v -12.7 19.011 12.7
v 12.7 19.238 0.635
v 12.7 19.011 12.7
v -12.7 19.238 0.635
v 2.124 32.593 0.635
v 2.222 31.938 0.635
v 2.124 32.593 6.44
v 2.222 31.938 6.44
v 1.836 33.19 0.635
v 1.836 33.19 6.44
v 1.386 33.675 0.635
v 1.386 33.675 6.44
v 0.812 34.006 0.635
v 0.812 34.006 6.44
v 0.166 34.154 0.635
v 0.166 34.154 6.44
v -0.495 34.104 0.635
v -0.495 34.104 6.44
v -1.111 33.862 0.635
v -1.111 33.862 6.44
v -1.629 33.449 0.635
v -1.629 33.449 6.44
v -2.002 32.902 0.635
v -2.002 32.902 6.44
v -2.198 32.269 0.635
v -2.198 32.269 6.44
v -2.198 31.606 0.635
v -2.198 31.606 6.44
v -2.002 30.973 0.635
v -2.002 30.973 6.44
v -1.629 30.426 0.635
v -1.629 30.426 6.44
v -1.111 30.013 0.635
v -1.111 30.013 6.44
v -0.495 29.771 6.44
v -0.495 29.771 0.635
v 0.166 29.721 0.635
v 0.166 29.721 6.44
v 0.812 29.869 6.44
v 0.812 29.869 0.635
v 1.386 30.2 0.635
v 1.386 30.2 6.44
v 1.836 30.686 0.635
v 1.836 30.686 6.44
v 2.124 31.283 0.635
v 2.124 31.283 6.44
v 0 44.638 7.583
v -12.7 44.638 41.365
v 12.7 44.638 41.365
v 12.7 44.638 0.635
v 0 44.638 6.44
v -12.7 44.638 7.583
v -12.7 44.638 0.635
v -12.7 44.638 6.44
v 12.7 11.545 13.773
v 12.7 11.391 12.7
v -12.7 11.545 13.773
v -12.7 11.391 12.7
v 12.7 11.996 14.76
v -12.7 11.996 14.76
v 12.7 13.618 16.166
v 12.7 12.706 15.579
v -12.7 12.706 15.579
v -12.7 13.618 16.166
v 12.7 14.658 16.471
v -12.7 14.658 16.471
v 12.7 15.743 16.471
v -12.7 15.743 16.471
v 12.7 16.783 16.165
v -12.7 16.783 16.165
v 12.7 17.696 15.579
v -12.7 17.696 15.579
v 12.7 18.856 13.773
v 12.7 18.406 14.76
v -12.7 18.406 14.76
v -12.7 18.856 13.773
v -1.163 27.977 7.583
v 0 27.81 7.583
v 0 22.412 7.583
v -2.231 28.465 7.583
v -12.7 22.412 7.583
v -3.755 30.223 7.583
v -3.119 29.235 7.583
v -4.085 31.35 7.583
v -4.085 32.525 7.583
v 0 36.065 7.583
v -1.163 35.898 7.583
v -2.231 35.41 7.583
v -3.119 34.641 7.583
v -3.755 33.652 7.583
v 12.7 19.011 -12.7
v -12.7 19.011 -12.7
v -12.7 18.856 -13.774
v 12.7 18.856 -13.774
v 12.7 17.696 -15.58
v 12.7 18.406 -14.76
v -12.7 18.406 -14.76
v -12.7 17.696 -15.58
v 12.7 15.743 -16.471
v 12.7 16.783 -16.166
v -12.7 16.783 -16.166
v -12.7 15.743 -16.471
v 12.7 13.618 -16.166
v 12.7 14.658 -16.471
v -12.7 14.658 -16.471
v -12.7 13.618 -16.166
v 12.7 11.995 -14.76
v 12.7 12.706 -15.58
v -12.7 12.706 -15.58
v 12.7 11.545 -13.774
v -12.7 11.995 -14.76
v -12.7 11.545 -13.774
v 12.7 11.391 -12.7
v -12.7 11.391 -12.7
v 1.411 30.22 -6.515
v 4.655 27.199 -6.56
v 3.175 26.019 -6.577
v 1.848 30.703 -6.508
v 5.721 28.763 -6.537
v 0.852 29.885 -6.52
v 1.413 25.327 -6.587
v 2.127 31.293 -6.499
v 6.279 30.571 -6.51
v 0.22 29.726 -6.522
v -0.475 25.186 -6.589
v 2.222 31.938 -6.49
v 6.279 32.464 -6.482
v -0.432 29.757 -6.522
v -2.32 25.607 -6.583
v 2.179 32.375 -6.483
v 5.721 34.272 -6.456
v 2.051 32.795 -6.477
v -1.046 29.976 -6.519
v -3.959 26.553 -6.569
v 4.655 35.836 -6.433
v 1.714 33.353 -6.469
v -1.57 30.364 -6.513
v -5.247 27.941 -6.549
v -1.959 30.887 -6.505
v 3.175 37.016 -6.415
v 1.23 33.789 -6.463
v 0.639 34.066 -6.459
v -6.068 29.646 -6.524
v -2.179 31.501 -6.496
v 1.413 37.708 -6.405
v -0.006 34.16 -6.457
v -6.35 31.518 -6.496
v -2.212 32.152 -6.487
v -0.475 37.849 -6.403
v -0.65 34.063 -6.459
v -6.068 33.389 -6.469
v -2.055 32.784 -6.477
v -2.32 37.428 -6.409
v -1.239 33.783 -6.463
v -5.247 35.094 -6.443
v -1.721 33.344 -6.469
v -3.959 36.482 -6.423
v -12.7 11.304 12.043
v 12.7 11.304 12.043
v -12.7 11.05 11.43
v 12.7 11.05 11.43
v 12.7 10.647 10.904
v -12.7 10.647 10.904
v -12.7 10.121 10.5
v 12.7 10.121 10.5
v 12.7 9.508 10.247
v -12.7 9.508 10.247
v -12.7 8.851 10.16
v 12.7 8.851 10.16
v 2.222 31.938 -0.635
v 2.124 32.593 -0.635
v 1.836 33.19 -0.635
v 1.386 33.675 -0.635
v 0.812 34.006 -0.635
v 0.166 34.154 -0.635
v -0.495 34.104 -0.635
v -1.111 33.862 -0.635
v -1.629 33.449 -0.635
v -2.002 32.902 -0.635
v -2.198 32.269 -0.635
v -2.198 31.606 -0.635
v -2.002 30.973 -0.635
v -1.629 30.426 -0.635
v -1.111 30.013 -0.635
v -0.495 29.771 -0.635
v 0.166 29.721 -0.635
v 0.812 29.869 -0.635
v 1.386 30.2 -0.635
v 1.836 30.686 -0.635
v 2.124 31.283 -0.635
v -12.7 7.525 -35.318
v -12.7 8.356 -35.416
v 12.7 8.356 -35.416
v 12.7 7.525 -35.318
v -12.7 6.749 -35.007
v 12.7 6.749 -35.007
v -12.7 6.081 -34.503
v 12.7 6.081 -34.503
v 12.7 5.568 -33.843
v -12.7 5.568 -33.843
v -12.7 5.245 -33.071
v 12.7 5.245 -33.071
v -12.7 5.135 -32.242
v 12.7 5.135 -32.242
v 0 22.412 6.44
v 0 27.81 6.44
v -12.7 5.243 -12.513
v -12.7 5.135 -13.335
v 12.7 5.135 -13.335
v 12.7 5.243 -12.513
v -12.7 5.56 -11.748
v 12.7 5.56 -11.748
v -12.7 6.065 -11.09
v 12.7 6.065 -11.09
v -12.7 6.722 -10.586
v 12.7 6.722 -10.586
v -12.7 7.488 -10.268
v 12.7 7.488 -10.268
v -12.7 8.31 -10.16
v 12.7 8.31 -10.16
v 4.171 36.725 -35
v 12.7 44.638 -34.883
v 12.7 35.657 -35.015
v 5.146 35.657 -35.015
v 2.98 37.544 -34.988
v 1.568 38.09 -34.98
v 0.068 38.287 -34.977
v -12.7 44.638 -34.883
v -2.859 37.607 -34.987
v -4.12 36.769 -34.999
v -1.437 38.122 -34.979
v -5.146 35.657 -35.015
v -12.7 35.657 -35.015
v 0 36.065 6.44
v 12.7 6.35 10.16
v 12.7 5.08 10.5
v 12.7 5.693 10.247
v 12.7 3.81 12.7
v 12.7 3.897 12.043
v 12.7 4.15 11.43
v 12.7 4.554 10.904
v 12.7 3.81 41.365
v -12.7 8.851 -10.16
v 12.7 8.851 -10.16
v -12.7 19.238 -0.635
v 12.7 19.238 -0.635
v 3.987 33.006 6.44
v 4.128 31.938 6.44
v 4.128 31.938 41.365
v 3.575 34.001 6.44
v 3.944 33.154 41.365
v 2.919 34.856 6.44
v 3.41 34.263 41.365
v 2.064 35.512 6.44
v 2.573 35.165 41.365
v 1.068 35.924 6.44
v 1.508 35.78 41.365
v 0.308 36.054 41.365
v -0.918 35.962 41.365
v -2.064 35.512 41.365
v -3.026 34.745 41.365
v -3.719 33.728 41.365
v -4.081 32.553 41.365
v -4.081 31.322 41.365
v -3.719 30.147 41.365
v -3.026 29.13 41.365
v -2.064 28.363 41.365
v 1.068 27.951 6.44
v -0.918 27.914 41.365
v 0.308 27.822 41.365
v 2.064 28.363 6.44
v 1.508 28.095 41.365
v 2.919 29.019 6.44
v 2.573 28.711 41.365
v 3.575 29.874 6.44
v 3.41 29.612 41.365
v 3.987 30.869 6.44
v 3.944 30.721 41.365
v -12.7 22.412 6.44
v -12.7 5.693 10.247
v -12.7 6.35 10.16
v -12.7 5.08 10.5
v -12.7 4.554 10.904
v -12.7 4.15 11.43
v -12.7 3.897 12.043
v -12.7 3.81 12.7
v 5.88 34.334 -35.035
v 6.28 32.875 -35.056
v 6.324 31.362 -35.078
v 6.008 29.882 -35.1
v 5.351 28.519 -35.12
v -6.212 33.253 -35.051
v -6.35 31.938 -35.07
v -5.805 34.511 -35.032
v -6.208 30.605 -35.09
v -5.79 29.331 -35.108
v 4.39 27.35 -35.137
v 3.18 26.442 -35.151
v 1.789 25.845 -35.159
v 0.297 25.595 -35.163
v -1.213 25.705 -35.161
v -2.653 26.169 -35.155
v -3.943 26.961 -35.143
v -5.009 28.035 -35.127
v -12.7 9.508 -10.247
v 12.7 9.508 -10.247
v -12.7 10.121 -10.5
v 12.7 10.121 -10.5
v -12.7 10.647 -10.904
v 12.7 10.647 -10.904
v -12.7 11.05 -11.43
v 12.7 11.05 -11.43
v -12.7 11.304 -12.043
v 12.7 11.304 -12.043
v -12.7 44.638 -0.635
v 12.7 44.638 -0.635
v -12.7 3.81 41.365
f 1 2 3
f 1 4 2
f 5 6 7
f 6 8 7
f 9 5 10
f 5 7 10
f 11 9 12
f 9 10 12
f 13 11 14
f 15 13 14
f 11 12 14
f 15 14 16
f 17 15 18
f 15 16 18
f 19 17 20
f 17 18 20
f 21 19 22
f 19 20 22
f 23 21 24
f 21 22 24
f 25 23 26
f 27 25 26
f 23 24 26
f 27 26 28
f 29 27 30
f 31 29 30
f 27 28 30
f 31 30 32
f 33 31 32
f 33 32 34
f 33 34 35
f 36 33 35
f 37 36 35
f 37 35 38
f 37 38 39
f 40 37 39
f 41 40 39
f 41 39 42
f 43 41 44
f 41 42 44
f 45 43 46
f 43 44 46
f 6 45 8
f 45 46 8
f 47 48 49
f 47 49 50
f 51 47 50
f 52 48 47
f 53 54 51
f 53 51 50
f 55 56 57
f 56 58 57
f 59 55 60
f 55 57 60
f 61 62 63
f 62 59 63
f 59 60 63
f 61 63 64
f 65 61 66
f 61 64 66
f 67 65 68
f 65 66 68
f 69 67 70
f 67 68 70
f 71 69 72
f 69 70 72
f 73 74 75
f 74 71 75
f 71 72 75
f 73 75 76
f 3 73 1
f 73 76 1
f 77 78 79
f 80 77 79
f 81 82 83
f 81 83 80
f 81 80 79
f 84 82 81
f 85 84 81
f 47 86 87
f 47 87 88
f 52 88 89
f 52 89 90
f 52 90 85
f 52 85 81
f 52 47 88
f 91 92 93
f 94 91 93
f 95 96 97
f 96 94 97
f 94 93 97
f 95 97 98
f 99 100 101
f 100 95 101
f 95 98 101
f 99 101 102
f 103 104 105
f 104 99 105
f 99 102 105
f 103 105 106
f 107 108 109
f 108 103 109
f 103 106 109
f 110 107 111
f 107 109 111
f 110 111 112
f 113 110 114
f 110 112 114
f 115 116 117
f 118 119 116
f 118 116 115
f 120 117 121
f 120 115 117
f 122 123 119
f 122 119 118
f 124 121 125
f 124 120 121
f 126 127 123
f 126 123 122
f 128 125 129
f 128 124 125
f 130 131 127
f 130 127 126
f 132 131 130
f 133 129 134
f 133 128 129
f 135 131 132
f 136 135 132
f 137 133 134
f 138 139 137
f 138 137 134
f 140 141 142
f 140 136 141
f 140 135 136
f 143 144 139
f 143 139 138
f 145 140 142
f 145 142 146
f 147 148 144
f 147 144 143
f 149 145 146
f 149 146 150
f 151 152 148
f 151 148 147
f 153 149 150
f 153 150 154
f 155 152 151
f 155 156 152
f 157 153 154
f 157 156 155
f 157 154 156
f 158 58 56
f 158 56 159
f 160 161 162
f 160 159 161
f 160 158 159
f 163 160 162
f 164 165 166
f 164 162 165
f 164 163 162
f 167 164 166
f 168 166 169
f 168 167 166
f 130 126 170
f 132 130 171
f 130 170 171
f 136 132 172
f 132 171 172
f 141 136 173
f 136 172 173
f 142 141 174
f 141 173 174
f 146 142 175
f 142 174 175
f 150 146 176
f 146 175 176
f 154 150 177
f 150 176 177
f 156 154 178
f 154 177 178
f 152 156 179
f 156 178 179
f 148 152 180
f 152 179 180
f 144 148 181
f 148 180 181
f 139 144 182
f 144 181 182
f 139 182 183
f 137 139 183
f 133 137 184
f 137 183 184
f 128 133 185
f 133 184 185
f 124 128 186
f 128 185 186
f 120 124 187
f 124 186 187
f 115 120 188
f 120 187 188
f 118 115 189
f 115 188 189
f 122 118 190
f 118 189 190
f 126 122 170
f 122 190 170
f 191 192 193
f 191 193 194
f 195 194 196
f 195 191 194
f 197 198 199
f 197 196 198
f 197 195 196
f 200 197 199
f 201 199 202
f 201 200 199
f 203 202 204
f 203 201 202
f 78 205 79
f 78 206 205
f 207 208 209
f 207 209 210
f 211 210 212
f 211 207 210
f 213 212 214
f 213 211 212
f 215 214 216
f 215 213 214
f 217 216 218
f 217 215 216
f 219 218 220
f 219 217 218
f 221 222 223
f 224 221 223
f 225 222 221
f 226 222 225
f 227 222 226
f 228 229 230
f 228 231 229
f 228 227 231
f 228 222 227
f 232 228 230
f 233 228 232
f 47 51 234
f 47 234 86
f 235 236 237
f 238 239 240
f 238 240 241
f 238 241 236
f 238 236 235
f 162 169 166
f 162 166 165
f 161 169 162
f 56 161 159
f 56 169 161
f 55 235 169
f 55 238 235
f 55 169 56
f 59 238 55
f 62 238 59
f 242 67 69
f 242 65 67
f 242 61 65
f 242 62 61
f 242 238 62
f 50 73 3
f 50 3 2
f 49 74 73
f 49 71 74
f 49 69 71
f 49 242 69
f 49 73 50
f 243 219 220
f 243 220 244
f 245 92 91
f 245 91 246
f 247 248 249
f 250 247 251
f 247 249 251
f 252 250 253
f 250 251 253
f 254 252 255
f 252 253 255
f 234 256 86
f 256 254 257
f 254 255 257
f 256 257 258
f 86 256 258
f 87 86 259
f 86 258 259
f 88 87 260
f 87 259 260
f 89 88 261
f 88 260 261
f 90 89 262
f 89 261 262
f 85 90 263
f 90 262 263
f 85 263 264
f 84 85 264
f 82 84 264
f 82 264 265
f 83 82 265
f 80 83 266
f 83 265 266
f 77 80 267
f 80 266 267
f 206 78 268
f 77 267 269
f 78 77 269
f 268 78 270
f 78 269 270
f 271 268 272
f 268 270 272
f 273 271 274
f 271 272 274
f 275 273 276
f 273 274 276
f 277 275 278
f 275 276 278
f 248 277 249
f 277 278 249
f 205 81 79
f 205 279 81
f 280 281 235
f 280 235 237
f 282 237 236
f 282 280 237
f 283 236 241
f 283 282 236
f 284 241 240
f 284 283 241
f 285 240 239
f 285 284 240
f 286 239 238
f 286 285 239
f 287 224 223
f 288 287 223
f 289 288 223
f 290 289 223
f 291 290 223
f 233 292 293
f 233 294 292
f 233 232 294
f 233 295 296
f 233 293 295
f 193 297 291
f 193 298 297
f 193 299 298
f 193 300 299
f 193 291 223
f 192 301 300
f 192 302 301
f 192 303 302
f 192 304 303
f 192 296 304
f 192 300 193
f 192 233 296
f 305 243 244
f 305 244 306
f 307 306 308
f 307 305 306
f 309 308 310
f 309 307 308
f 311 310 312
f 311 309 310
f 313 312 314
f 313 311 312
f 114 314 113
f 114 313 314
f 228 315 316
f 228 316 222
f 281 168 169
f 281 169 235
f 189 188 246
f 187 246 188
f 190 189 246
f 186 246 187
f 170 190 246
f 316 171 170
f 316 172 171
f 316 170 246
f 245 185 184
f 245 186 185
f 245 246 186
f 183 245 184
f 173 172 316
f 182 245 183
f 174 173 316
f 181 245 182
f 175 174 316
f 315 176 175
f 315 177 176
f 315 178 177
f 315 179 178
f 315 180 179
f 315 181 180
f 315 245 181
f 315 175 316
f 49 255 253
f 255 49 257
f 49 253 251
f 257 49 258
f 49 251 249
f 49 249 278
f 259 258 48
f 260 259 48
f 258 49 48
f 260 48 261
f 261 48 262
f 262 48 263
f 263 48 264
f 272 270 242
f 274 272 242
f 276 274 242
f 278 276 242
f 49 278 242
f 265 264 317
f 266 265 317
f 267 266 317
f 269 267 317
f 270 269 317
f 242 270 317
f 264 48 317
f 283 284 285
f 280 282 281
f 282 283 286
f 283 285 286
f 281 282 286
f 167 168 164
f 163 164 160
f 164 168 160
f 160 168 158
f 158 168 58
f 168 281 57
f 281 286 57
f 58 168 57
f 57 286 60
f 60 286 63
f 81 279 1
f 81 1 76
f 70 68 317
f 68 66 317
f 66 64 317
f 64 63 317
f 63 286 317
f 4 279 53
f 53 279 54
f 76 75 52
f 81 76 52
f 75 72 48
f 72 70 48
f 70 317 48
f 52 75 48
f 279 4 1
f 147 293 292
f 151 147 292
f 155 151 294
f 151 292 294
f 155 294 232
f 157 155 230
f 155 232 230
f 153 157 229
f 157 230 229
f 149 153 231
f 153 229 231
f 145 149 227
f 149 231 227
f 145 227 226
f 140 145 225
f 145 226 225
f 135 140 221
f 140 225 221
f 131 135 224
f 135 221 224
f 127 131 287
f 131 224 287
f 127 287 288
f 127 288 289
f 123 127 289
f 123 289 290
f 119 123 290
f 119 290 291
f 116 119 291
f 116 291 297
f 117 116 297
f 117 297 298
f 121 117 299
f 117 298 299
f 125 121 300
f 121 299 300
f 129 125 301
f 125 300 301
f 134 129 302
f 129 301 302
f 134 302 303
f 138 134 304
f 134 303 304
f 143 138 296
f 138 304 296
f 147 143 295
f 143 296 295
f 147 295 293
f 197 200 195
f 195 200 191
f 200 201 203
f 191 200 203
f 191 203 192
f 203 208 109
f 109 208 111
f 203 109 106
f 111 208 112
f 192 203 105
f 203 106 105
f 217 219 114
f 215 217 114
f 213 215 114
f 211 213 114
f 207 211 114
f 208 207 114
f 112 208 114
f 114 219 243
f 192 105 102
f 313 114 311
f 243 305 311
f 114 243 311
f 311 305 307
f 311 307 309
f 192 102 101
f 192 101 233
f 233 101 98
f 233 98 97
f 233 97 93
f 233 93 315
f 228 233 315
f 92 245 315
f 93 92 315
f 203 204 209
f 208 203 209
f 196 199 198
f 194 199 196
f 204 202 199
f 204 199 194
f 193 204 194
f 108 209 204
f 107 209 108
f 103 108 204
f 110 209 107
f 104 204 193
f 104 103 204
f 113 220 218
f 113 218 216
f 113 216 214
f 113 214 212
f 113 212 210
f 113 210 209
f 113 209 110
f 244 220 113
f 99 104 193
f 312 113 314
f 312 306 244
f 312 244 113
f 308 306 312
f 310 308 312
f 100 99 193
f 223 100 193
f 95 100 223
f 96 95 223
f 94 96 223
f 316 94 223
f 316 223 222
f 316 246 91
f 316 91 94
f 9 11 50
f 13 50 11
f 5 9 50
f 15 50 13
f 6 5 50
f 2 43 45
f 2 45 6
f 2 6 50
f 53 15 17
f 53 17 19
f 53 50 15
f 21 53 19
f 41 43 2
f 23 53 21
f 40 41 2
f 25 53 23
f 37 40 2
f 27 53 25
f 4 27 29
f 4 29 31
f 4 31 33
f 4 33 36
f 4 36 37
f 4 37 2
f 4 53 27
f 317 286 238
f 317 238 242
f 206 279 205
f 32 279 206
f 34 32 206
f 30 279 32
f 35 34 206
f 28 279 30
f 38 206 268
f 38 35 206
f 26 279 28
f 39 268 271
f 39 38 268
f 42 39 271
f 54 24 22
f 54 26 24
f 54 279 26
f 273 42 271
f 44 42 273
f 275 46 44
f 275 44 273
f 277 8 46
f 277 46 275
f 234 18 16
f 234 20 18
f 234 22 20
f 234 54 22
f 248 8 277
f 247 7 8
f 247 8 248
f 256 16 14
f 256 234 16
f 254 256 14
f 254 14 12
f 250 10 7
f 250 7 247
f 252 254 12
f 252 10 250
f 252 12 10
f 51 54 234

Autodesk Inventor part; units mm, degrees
ref_plane "YZ Plane" through (0, 0, 0) normal (1, 0, 0) x (0, 1, 0)
sketch "Sketch1" plane through (0, 0, 0) normal (1, 0, 0) x (0, 1, 0)
  line L0 (-3.175, -15.8752) -> (-3.175, 15.8752)
  arc A0 (18.3756, 12.6998) -> (12.0256, 12.7) centre (15.2006, 12.6998) ccw
  arc A1 (12.0256, -12.7002) -> (18.3756, -12.7002) centre (15.2006, -12.7002) ccw
  line L1 (8.8506, 9.5252) -> (6.35, 9.5252)
  line L2 (8.8506, -9.5252) -> (5.1346, -9.5252)
  line L3 (15.2006, 12.6998) -> (15.2006, -12.7002) construction
  line L4 (3.175, 14.6052) -> (3.175, 12.7002)
  arc A2 (8.8506, 9.5252) -> (12.0256, 12.7) centre (8.8506, 12.7002) ccw
  arc A3 (12.0256, -12.7002) -> (8.8506, -9.5252) centre (8.8506, -12.7002) ccw
  arc A4 (3.175, 12.7002) -> (6.35, 9.5252) centre (6.35, 12.7002) ccw
  arc A5 (5.1346, -9.5252) -> (1.9937, -12.2364) centre (5.1346, -12.7002) ccw
  line L5 (-3.175, -15.8752) -> (-3.175, -22.2252)
  line L6 (1.905, 15.8752) -> (-3.175, 15.8752)
  arc A6 (3.175, 14.6052) -> (1.905, 15.8752) centre (1.905, 14.6052) ccw
  line L7 (18.3756, 12.6998) -> (18.3756, -12.7002)
  line L8 (1.6475, -13.2791) -> (-3.175, -22.2252)
  arc A7 (1.6475, -13.2791) -> (1.9937, -12.2364) centre (-1.1473, -11.7726) ccw
  line L9 (44.6375, 0.635) -> (19.2375, 0.635)
  line L10 (19.2375, 0.635) -> (19.2375, -0.635) construction
  line L11 (19.2375, -0.635) -> (44.6375, -0.635)
  line L12 (44.6375, -0.635) -> (44.6375, 0.635) construction
  line L13 (44.6375, 0.635) -> (19.2375, -0.635) construction
  line L14 (19.2375, 0.635) -> (44.6375, -0.635) construction
  line L15 (-13.1873, 0) -> (54.275, 0) projected
  line L16 (44.6375, -0.635) -> (44.6375, -26.035)
  line L17 (35.6573, -35.0153) -> (8.3561, -35.4163)
  line L18 (5.1346, -32.2418) -> (5.1346, -13.3352)
  line L19 (44.6375, 0.635) -> (44.6375, 32.385)
  line L20 (35.6573, 41.3653) -> (3.81, 41.3653)
  arc A8 (5.1346, -32.2418) -> (8.3561, -35.4163) centre (8.3094, -32.2418) ccw
  arc A9 (8.8506, 10.1602) -> (11.3906, 12.7) centre (8.8506, 12.7002) ccw
  line L21 (8.8506, 10.1602) -> (6.35, 10.1602)
  arc A10 (3.81, 12.7002) -> (6.35, 10.1602) centre (6.35, 12.7002) ccw
  line L22 (3.81, 12.7002) -> (3.81, 41.3653)
  line L23 (8.3096, -10.1602) -> (8.8506, -10.1602)
  arc A11 (11.3906, -12.7002) -> (8.8506, -10.1602) centre (8.8506, -12.7002) ccw
  arc A12 (11.3906, -12.7002) -> (19.0106, -12.7002) centre (15.2006, -12.7002) ccw
  arc A13 (19.0106, 12.6998) -> (11.3906, 12.7) centre (15.2006, 12.6998) ccw
  line L24 (-3.5499, 0) -> (-3.5499, -1.7744)
  line L25 (19.0106, -12.7002) -> (19.2375, -0.635)
  line L26 (19.2375, 0.635) -> (19.0106, 12.6998)
  arc A14 (8.3096, -10.1602) -> (5.1346, -13.3352) centre (8.3096, -13.3352) ccw
  line L27 (-3.175, -22.2252) -> (1.6475, -22.2252)
  line L28 (35.6573, 41.3653) -> (44.6375, 41.3653)
  line L29 (44.6375, 41.3653) -> (44.6375, 32.385)
  line L30 (44.6375, -26.035) -> (44.6375, -34.8834)
  line L31 (44.6375, -34.8834) -> (35.6573, -35.0153)
  point P0 (0, 0)
  point P1 (15.2516, 9.5252)
  point P2 (15.2006, -9.5252)
  point P3 (1.9596, -12.7002)
  point P4 (31.9375, 0)
  point P5 (31.9375, 0)
  dimension "d5" = 6.35
  dimension "d8" = 3.175
  dimension "d9" = 6.35
  dimension "d11" = 6.35
  dimension "d12" = 6.35
  dimension "d13" = 1.27
  dimension "d30" = 25.4
  dimension "d31" = 3.175
  dimension "d51" = 1.27
  dimension "d54" = 25.4
  dimension "d56" = 25.4
  dimension "d59" = 31.75
  dimension "d60" = 0.635
  dimension "d61" = 3.175
extrude "Extrusion8" add sketch "Sketch1" along normal mid plane 25.4 contours L9 L26 A13 A9 L21 A10 L22 L20 L28 L29 L19 | L11 L16 L30 L31 L17 A8 L18 A14 L23 A11 A12 L25
ref_plane "Work Plane12" through (-12.7, 35.6573, 41.3653) normal (0, 0, 1) x (1, 0, 0)
sketch "Sketch9" plane through (-12.7, 35.6573, 41.3653) normal (0, 0, 1) x (1, 0, 0)
  line L0 (0, -16.4197) -> (25.4, -16.4197) projected
  line L1 (25.4, 8.9803) -> (25.4, -16.4197) projected
  line L2 (25.4, 8.9803) -> (0, 8.9803) projected
  line L3 (0, -16.4197) -> (0, 8.9803) projected
  circle A0 centre (12.7, -3.7197) radius 2.2225
  point P0 (12.7, -35.6573)
  dimension "d68" = 4.445
extrude "Extrusion10" cut sketch "Sketch9" against normal through all contours A0
ref_plane "Work Plane13" through (-12.7, 35.6573, 41.3653) normal (0, 0, 1) x (1, 0, 0)
sketch "Sketch10" plane through (-12.7, 35.6573, 41.3653) normal (0, 0, 1) x (1, 0, 0)
  circle A0 centre (12.7, -3.7197) radius 2.2225 projected
  circle A1 centre (12.7, -3.7197) radius 4.1275
  point P0 (12.7, -35.6573)
  dimension "d71" = 8.255
extrude "Extrusion11" cut sketch "Sketch10" against normal blind 34.925
sketch "Sketch11" plane through (12.7, 35.6573, -35.0153) normal (0, 0.0147, -0.9999) x (-1, 0, 0)
  ellipse E0 centre (12.7, -3.7201) end of major axis (12.7, -1.4974) minor radius 2.2225 projected
  circle A0 centre (12.7, -3.7201) radius 6.35
  point P0 (12.7, -35.1392)
  dimension "d74" = 12.7
extrude "Extrusion12" cut sketch "Sketch11" against normal blind 28.575 contours E0 | A0
sketch "Sketch12" plane through (-12.7, 44.6375, 41.3653) normal (0, 1, 0) x (1, 0, 0)
  line L0 (0, 28.6651) -> (0, 0) projected
  line L1 (12.7, 33.782) -> (0, 33.782)
  line L2 (0, 33.782) -> (0, 34.925)
  line L3 (0, 34.925) -> (12.7, 34.925)
  line L4 (12.7, 34.925) -> (12.7, 33.782)
  line L5 (25.4, 0) -> (0, 0) projected
  line L6 (25.4, 40.7303) -> (25.4, 0) projected
  point P0 (12.7, 41.3653)
  dimension "d87" = 12.7
  dimension "d88" = 1.143
  dimension "d89" = 34.925
extrude "Extrusion15" cut sketch "Sketch12" against normal blind 22.225
properties part number "Cup Holder Bracket Mirror" material "Acetal Resin, Black"
